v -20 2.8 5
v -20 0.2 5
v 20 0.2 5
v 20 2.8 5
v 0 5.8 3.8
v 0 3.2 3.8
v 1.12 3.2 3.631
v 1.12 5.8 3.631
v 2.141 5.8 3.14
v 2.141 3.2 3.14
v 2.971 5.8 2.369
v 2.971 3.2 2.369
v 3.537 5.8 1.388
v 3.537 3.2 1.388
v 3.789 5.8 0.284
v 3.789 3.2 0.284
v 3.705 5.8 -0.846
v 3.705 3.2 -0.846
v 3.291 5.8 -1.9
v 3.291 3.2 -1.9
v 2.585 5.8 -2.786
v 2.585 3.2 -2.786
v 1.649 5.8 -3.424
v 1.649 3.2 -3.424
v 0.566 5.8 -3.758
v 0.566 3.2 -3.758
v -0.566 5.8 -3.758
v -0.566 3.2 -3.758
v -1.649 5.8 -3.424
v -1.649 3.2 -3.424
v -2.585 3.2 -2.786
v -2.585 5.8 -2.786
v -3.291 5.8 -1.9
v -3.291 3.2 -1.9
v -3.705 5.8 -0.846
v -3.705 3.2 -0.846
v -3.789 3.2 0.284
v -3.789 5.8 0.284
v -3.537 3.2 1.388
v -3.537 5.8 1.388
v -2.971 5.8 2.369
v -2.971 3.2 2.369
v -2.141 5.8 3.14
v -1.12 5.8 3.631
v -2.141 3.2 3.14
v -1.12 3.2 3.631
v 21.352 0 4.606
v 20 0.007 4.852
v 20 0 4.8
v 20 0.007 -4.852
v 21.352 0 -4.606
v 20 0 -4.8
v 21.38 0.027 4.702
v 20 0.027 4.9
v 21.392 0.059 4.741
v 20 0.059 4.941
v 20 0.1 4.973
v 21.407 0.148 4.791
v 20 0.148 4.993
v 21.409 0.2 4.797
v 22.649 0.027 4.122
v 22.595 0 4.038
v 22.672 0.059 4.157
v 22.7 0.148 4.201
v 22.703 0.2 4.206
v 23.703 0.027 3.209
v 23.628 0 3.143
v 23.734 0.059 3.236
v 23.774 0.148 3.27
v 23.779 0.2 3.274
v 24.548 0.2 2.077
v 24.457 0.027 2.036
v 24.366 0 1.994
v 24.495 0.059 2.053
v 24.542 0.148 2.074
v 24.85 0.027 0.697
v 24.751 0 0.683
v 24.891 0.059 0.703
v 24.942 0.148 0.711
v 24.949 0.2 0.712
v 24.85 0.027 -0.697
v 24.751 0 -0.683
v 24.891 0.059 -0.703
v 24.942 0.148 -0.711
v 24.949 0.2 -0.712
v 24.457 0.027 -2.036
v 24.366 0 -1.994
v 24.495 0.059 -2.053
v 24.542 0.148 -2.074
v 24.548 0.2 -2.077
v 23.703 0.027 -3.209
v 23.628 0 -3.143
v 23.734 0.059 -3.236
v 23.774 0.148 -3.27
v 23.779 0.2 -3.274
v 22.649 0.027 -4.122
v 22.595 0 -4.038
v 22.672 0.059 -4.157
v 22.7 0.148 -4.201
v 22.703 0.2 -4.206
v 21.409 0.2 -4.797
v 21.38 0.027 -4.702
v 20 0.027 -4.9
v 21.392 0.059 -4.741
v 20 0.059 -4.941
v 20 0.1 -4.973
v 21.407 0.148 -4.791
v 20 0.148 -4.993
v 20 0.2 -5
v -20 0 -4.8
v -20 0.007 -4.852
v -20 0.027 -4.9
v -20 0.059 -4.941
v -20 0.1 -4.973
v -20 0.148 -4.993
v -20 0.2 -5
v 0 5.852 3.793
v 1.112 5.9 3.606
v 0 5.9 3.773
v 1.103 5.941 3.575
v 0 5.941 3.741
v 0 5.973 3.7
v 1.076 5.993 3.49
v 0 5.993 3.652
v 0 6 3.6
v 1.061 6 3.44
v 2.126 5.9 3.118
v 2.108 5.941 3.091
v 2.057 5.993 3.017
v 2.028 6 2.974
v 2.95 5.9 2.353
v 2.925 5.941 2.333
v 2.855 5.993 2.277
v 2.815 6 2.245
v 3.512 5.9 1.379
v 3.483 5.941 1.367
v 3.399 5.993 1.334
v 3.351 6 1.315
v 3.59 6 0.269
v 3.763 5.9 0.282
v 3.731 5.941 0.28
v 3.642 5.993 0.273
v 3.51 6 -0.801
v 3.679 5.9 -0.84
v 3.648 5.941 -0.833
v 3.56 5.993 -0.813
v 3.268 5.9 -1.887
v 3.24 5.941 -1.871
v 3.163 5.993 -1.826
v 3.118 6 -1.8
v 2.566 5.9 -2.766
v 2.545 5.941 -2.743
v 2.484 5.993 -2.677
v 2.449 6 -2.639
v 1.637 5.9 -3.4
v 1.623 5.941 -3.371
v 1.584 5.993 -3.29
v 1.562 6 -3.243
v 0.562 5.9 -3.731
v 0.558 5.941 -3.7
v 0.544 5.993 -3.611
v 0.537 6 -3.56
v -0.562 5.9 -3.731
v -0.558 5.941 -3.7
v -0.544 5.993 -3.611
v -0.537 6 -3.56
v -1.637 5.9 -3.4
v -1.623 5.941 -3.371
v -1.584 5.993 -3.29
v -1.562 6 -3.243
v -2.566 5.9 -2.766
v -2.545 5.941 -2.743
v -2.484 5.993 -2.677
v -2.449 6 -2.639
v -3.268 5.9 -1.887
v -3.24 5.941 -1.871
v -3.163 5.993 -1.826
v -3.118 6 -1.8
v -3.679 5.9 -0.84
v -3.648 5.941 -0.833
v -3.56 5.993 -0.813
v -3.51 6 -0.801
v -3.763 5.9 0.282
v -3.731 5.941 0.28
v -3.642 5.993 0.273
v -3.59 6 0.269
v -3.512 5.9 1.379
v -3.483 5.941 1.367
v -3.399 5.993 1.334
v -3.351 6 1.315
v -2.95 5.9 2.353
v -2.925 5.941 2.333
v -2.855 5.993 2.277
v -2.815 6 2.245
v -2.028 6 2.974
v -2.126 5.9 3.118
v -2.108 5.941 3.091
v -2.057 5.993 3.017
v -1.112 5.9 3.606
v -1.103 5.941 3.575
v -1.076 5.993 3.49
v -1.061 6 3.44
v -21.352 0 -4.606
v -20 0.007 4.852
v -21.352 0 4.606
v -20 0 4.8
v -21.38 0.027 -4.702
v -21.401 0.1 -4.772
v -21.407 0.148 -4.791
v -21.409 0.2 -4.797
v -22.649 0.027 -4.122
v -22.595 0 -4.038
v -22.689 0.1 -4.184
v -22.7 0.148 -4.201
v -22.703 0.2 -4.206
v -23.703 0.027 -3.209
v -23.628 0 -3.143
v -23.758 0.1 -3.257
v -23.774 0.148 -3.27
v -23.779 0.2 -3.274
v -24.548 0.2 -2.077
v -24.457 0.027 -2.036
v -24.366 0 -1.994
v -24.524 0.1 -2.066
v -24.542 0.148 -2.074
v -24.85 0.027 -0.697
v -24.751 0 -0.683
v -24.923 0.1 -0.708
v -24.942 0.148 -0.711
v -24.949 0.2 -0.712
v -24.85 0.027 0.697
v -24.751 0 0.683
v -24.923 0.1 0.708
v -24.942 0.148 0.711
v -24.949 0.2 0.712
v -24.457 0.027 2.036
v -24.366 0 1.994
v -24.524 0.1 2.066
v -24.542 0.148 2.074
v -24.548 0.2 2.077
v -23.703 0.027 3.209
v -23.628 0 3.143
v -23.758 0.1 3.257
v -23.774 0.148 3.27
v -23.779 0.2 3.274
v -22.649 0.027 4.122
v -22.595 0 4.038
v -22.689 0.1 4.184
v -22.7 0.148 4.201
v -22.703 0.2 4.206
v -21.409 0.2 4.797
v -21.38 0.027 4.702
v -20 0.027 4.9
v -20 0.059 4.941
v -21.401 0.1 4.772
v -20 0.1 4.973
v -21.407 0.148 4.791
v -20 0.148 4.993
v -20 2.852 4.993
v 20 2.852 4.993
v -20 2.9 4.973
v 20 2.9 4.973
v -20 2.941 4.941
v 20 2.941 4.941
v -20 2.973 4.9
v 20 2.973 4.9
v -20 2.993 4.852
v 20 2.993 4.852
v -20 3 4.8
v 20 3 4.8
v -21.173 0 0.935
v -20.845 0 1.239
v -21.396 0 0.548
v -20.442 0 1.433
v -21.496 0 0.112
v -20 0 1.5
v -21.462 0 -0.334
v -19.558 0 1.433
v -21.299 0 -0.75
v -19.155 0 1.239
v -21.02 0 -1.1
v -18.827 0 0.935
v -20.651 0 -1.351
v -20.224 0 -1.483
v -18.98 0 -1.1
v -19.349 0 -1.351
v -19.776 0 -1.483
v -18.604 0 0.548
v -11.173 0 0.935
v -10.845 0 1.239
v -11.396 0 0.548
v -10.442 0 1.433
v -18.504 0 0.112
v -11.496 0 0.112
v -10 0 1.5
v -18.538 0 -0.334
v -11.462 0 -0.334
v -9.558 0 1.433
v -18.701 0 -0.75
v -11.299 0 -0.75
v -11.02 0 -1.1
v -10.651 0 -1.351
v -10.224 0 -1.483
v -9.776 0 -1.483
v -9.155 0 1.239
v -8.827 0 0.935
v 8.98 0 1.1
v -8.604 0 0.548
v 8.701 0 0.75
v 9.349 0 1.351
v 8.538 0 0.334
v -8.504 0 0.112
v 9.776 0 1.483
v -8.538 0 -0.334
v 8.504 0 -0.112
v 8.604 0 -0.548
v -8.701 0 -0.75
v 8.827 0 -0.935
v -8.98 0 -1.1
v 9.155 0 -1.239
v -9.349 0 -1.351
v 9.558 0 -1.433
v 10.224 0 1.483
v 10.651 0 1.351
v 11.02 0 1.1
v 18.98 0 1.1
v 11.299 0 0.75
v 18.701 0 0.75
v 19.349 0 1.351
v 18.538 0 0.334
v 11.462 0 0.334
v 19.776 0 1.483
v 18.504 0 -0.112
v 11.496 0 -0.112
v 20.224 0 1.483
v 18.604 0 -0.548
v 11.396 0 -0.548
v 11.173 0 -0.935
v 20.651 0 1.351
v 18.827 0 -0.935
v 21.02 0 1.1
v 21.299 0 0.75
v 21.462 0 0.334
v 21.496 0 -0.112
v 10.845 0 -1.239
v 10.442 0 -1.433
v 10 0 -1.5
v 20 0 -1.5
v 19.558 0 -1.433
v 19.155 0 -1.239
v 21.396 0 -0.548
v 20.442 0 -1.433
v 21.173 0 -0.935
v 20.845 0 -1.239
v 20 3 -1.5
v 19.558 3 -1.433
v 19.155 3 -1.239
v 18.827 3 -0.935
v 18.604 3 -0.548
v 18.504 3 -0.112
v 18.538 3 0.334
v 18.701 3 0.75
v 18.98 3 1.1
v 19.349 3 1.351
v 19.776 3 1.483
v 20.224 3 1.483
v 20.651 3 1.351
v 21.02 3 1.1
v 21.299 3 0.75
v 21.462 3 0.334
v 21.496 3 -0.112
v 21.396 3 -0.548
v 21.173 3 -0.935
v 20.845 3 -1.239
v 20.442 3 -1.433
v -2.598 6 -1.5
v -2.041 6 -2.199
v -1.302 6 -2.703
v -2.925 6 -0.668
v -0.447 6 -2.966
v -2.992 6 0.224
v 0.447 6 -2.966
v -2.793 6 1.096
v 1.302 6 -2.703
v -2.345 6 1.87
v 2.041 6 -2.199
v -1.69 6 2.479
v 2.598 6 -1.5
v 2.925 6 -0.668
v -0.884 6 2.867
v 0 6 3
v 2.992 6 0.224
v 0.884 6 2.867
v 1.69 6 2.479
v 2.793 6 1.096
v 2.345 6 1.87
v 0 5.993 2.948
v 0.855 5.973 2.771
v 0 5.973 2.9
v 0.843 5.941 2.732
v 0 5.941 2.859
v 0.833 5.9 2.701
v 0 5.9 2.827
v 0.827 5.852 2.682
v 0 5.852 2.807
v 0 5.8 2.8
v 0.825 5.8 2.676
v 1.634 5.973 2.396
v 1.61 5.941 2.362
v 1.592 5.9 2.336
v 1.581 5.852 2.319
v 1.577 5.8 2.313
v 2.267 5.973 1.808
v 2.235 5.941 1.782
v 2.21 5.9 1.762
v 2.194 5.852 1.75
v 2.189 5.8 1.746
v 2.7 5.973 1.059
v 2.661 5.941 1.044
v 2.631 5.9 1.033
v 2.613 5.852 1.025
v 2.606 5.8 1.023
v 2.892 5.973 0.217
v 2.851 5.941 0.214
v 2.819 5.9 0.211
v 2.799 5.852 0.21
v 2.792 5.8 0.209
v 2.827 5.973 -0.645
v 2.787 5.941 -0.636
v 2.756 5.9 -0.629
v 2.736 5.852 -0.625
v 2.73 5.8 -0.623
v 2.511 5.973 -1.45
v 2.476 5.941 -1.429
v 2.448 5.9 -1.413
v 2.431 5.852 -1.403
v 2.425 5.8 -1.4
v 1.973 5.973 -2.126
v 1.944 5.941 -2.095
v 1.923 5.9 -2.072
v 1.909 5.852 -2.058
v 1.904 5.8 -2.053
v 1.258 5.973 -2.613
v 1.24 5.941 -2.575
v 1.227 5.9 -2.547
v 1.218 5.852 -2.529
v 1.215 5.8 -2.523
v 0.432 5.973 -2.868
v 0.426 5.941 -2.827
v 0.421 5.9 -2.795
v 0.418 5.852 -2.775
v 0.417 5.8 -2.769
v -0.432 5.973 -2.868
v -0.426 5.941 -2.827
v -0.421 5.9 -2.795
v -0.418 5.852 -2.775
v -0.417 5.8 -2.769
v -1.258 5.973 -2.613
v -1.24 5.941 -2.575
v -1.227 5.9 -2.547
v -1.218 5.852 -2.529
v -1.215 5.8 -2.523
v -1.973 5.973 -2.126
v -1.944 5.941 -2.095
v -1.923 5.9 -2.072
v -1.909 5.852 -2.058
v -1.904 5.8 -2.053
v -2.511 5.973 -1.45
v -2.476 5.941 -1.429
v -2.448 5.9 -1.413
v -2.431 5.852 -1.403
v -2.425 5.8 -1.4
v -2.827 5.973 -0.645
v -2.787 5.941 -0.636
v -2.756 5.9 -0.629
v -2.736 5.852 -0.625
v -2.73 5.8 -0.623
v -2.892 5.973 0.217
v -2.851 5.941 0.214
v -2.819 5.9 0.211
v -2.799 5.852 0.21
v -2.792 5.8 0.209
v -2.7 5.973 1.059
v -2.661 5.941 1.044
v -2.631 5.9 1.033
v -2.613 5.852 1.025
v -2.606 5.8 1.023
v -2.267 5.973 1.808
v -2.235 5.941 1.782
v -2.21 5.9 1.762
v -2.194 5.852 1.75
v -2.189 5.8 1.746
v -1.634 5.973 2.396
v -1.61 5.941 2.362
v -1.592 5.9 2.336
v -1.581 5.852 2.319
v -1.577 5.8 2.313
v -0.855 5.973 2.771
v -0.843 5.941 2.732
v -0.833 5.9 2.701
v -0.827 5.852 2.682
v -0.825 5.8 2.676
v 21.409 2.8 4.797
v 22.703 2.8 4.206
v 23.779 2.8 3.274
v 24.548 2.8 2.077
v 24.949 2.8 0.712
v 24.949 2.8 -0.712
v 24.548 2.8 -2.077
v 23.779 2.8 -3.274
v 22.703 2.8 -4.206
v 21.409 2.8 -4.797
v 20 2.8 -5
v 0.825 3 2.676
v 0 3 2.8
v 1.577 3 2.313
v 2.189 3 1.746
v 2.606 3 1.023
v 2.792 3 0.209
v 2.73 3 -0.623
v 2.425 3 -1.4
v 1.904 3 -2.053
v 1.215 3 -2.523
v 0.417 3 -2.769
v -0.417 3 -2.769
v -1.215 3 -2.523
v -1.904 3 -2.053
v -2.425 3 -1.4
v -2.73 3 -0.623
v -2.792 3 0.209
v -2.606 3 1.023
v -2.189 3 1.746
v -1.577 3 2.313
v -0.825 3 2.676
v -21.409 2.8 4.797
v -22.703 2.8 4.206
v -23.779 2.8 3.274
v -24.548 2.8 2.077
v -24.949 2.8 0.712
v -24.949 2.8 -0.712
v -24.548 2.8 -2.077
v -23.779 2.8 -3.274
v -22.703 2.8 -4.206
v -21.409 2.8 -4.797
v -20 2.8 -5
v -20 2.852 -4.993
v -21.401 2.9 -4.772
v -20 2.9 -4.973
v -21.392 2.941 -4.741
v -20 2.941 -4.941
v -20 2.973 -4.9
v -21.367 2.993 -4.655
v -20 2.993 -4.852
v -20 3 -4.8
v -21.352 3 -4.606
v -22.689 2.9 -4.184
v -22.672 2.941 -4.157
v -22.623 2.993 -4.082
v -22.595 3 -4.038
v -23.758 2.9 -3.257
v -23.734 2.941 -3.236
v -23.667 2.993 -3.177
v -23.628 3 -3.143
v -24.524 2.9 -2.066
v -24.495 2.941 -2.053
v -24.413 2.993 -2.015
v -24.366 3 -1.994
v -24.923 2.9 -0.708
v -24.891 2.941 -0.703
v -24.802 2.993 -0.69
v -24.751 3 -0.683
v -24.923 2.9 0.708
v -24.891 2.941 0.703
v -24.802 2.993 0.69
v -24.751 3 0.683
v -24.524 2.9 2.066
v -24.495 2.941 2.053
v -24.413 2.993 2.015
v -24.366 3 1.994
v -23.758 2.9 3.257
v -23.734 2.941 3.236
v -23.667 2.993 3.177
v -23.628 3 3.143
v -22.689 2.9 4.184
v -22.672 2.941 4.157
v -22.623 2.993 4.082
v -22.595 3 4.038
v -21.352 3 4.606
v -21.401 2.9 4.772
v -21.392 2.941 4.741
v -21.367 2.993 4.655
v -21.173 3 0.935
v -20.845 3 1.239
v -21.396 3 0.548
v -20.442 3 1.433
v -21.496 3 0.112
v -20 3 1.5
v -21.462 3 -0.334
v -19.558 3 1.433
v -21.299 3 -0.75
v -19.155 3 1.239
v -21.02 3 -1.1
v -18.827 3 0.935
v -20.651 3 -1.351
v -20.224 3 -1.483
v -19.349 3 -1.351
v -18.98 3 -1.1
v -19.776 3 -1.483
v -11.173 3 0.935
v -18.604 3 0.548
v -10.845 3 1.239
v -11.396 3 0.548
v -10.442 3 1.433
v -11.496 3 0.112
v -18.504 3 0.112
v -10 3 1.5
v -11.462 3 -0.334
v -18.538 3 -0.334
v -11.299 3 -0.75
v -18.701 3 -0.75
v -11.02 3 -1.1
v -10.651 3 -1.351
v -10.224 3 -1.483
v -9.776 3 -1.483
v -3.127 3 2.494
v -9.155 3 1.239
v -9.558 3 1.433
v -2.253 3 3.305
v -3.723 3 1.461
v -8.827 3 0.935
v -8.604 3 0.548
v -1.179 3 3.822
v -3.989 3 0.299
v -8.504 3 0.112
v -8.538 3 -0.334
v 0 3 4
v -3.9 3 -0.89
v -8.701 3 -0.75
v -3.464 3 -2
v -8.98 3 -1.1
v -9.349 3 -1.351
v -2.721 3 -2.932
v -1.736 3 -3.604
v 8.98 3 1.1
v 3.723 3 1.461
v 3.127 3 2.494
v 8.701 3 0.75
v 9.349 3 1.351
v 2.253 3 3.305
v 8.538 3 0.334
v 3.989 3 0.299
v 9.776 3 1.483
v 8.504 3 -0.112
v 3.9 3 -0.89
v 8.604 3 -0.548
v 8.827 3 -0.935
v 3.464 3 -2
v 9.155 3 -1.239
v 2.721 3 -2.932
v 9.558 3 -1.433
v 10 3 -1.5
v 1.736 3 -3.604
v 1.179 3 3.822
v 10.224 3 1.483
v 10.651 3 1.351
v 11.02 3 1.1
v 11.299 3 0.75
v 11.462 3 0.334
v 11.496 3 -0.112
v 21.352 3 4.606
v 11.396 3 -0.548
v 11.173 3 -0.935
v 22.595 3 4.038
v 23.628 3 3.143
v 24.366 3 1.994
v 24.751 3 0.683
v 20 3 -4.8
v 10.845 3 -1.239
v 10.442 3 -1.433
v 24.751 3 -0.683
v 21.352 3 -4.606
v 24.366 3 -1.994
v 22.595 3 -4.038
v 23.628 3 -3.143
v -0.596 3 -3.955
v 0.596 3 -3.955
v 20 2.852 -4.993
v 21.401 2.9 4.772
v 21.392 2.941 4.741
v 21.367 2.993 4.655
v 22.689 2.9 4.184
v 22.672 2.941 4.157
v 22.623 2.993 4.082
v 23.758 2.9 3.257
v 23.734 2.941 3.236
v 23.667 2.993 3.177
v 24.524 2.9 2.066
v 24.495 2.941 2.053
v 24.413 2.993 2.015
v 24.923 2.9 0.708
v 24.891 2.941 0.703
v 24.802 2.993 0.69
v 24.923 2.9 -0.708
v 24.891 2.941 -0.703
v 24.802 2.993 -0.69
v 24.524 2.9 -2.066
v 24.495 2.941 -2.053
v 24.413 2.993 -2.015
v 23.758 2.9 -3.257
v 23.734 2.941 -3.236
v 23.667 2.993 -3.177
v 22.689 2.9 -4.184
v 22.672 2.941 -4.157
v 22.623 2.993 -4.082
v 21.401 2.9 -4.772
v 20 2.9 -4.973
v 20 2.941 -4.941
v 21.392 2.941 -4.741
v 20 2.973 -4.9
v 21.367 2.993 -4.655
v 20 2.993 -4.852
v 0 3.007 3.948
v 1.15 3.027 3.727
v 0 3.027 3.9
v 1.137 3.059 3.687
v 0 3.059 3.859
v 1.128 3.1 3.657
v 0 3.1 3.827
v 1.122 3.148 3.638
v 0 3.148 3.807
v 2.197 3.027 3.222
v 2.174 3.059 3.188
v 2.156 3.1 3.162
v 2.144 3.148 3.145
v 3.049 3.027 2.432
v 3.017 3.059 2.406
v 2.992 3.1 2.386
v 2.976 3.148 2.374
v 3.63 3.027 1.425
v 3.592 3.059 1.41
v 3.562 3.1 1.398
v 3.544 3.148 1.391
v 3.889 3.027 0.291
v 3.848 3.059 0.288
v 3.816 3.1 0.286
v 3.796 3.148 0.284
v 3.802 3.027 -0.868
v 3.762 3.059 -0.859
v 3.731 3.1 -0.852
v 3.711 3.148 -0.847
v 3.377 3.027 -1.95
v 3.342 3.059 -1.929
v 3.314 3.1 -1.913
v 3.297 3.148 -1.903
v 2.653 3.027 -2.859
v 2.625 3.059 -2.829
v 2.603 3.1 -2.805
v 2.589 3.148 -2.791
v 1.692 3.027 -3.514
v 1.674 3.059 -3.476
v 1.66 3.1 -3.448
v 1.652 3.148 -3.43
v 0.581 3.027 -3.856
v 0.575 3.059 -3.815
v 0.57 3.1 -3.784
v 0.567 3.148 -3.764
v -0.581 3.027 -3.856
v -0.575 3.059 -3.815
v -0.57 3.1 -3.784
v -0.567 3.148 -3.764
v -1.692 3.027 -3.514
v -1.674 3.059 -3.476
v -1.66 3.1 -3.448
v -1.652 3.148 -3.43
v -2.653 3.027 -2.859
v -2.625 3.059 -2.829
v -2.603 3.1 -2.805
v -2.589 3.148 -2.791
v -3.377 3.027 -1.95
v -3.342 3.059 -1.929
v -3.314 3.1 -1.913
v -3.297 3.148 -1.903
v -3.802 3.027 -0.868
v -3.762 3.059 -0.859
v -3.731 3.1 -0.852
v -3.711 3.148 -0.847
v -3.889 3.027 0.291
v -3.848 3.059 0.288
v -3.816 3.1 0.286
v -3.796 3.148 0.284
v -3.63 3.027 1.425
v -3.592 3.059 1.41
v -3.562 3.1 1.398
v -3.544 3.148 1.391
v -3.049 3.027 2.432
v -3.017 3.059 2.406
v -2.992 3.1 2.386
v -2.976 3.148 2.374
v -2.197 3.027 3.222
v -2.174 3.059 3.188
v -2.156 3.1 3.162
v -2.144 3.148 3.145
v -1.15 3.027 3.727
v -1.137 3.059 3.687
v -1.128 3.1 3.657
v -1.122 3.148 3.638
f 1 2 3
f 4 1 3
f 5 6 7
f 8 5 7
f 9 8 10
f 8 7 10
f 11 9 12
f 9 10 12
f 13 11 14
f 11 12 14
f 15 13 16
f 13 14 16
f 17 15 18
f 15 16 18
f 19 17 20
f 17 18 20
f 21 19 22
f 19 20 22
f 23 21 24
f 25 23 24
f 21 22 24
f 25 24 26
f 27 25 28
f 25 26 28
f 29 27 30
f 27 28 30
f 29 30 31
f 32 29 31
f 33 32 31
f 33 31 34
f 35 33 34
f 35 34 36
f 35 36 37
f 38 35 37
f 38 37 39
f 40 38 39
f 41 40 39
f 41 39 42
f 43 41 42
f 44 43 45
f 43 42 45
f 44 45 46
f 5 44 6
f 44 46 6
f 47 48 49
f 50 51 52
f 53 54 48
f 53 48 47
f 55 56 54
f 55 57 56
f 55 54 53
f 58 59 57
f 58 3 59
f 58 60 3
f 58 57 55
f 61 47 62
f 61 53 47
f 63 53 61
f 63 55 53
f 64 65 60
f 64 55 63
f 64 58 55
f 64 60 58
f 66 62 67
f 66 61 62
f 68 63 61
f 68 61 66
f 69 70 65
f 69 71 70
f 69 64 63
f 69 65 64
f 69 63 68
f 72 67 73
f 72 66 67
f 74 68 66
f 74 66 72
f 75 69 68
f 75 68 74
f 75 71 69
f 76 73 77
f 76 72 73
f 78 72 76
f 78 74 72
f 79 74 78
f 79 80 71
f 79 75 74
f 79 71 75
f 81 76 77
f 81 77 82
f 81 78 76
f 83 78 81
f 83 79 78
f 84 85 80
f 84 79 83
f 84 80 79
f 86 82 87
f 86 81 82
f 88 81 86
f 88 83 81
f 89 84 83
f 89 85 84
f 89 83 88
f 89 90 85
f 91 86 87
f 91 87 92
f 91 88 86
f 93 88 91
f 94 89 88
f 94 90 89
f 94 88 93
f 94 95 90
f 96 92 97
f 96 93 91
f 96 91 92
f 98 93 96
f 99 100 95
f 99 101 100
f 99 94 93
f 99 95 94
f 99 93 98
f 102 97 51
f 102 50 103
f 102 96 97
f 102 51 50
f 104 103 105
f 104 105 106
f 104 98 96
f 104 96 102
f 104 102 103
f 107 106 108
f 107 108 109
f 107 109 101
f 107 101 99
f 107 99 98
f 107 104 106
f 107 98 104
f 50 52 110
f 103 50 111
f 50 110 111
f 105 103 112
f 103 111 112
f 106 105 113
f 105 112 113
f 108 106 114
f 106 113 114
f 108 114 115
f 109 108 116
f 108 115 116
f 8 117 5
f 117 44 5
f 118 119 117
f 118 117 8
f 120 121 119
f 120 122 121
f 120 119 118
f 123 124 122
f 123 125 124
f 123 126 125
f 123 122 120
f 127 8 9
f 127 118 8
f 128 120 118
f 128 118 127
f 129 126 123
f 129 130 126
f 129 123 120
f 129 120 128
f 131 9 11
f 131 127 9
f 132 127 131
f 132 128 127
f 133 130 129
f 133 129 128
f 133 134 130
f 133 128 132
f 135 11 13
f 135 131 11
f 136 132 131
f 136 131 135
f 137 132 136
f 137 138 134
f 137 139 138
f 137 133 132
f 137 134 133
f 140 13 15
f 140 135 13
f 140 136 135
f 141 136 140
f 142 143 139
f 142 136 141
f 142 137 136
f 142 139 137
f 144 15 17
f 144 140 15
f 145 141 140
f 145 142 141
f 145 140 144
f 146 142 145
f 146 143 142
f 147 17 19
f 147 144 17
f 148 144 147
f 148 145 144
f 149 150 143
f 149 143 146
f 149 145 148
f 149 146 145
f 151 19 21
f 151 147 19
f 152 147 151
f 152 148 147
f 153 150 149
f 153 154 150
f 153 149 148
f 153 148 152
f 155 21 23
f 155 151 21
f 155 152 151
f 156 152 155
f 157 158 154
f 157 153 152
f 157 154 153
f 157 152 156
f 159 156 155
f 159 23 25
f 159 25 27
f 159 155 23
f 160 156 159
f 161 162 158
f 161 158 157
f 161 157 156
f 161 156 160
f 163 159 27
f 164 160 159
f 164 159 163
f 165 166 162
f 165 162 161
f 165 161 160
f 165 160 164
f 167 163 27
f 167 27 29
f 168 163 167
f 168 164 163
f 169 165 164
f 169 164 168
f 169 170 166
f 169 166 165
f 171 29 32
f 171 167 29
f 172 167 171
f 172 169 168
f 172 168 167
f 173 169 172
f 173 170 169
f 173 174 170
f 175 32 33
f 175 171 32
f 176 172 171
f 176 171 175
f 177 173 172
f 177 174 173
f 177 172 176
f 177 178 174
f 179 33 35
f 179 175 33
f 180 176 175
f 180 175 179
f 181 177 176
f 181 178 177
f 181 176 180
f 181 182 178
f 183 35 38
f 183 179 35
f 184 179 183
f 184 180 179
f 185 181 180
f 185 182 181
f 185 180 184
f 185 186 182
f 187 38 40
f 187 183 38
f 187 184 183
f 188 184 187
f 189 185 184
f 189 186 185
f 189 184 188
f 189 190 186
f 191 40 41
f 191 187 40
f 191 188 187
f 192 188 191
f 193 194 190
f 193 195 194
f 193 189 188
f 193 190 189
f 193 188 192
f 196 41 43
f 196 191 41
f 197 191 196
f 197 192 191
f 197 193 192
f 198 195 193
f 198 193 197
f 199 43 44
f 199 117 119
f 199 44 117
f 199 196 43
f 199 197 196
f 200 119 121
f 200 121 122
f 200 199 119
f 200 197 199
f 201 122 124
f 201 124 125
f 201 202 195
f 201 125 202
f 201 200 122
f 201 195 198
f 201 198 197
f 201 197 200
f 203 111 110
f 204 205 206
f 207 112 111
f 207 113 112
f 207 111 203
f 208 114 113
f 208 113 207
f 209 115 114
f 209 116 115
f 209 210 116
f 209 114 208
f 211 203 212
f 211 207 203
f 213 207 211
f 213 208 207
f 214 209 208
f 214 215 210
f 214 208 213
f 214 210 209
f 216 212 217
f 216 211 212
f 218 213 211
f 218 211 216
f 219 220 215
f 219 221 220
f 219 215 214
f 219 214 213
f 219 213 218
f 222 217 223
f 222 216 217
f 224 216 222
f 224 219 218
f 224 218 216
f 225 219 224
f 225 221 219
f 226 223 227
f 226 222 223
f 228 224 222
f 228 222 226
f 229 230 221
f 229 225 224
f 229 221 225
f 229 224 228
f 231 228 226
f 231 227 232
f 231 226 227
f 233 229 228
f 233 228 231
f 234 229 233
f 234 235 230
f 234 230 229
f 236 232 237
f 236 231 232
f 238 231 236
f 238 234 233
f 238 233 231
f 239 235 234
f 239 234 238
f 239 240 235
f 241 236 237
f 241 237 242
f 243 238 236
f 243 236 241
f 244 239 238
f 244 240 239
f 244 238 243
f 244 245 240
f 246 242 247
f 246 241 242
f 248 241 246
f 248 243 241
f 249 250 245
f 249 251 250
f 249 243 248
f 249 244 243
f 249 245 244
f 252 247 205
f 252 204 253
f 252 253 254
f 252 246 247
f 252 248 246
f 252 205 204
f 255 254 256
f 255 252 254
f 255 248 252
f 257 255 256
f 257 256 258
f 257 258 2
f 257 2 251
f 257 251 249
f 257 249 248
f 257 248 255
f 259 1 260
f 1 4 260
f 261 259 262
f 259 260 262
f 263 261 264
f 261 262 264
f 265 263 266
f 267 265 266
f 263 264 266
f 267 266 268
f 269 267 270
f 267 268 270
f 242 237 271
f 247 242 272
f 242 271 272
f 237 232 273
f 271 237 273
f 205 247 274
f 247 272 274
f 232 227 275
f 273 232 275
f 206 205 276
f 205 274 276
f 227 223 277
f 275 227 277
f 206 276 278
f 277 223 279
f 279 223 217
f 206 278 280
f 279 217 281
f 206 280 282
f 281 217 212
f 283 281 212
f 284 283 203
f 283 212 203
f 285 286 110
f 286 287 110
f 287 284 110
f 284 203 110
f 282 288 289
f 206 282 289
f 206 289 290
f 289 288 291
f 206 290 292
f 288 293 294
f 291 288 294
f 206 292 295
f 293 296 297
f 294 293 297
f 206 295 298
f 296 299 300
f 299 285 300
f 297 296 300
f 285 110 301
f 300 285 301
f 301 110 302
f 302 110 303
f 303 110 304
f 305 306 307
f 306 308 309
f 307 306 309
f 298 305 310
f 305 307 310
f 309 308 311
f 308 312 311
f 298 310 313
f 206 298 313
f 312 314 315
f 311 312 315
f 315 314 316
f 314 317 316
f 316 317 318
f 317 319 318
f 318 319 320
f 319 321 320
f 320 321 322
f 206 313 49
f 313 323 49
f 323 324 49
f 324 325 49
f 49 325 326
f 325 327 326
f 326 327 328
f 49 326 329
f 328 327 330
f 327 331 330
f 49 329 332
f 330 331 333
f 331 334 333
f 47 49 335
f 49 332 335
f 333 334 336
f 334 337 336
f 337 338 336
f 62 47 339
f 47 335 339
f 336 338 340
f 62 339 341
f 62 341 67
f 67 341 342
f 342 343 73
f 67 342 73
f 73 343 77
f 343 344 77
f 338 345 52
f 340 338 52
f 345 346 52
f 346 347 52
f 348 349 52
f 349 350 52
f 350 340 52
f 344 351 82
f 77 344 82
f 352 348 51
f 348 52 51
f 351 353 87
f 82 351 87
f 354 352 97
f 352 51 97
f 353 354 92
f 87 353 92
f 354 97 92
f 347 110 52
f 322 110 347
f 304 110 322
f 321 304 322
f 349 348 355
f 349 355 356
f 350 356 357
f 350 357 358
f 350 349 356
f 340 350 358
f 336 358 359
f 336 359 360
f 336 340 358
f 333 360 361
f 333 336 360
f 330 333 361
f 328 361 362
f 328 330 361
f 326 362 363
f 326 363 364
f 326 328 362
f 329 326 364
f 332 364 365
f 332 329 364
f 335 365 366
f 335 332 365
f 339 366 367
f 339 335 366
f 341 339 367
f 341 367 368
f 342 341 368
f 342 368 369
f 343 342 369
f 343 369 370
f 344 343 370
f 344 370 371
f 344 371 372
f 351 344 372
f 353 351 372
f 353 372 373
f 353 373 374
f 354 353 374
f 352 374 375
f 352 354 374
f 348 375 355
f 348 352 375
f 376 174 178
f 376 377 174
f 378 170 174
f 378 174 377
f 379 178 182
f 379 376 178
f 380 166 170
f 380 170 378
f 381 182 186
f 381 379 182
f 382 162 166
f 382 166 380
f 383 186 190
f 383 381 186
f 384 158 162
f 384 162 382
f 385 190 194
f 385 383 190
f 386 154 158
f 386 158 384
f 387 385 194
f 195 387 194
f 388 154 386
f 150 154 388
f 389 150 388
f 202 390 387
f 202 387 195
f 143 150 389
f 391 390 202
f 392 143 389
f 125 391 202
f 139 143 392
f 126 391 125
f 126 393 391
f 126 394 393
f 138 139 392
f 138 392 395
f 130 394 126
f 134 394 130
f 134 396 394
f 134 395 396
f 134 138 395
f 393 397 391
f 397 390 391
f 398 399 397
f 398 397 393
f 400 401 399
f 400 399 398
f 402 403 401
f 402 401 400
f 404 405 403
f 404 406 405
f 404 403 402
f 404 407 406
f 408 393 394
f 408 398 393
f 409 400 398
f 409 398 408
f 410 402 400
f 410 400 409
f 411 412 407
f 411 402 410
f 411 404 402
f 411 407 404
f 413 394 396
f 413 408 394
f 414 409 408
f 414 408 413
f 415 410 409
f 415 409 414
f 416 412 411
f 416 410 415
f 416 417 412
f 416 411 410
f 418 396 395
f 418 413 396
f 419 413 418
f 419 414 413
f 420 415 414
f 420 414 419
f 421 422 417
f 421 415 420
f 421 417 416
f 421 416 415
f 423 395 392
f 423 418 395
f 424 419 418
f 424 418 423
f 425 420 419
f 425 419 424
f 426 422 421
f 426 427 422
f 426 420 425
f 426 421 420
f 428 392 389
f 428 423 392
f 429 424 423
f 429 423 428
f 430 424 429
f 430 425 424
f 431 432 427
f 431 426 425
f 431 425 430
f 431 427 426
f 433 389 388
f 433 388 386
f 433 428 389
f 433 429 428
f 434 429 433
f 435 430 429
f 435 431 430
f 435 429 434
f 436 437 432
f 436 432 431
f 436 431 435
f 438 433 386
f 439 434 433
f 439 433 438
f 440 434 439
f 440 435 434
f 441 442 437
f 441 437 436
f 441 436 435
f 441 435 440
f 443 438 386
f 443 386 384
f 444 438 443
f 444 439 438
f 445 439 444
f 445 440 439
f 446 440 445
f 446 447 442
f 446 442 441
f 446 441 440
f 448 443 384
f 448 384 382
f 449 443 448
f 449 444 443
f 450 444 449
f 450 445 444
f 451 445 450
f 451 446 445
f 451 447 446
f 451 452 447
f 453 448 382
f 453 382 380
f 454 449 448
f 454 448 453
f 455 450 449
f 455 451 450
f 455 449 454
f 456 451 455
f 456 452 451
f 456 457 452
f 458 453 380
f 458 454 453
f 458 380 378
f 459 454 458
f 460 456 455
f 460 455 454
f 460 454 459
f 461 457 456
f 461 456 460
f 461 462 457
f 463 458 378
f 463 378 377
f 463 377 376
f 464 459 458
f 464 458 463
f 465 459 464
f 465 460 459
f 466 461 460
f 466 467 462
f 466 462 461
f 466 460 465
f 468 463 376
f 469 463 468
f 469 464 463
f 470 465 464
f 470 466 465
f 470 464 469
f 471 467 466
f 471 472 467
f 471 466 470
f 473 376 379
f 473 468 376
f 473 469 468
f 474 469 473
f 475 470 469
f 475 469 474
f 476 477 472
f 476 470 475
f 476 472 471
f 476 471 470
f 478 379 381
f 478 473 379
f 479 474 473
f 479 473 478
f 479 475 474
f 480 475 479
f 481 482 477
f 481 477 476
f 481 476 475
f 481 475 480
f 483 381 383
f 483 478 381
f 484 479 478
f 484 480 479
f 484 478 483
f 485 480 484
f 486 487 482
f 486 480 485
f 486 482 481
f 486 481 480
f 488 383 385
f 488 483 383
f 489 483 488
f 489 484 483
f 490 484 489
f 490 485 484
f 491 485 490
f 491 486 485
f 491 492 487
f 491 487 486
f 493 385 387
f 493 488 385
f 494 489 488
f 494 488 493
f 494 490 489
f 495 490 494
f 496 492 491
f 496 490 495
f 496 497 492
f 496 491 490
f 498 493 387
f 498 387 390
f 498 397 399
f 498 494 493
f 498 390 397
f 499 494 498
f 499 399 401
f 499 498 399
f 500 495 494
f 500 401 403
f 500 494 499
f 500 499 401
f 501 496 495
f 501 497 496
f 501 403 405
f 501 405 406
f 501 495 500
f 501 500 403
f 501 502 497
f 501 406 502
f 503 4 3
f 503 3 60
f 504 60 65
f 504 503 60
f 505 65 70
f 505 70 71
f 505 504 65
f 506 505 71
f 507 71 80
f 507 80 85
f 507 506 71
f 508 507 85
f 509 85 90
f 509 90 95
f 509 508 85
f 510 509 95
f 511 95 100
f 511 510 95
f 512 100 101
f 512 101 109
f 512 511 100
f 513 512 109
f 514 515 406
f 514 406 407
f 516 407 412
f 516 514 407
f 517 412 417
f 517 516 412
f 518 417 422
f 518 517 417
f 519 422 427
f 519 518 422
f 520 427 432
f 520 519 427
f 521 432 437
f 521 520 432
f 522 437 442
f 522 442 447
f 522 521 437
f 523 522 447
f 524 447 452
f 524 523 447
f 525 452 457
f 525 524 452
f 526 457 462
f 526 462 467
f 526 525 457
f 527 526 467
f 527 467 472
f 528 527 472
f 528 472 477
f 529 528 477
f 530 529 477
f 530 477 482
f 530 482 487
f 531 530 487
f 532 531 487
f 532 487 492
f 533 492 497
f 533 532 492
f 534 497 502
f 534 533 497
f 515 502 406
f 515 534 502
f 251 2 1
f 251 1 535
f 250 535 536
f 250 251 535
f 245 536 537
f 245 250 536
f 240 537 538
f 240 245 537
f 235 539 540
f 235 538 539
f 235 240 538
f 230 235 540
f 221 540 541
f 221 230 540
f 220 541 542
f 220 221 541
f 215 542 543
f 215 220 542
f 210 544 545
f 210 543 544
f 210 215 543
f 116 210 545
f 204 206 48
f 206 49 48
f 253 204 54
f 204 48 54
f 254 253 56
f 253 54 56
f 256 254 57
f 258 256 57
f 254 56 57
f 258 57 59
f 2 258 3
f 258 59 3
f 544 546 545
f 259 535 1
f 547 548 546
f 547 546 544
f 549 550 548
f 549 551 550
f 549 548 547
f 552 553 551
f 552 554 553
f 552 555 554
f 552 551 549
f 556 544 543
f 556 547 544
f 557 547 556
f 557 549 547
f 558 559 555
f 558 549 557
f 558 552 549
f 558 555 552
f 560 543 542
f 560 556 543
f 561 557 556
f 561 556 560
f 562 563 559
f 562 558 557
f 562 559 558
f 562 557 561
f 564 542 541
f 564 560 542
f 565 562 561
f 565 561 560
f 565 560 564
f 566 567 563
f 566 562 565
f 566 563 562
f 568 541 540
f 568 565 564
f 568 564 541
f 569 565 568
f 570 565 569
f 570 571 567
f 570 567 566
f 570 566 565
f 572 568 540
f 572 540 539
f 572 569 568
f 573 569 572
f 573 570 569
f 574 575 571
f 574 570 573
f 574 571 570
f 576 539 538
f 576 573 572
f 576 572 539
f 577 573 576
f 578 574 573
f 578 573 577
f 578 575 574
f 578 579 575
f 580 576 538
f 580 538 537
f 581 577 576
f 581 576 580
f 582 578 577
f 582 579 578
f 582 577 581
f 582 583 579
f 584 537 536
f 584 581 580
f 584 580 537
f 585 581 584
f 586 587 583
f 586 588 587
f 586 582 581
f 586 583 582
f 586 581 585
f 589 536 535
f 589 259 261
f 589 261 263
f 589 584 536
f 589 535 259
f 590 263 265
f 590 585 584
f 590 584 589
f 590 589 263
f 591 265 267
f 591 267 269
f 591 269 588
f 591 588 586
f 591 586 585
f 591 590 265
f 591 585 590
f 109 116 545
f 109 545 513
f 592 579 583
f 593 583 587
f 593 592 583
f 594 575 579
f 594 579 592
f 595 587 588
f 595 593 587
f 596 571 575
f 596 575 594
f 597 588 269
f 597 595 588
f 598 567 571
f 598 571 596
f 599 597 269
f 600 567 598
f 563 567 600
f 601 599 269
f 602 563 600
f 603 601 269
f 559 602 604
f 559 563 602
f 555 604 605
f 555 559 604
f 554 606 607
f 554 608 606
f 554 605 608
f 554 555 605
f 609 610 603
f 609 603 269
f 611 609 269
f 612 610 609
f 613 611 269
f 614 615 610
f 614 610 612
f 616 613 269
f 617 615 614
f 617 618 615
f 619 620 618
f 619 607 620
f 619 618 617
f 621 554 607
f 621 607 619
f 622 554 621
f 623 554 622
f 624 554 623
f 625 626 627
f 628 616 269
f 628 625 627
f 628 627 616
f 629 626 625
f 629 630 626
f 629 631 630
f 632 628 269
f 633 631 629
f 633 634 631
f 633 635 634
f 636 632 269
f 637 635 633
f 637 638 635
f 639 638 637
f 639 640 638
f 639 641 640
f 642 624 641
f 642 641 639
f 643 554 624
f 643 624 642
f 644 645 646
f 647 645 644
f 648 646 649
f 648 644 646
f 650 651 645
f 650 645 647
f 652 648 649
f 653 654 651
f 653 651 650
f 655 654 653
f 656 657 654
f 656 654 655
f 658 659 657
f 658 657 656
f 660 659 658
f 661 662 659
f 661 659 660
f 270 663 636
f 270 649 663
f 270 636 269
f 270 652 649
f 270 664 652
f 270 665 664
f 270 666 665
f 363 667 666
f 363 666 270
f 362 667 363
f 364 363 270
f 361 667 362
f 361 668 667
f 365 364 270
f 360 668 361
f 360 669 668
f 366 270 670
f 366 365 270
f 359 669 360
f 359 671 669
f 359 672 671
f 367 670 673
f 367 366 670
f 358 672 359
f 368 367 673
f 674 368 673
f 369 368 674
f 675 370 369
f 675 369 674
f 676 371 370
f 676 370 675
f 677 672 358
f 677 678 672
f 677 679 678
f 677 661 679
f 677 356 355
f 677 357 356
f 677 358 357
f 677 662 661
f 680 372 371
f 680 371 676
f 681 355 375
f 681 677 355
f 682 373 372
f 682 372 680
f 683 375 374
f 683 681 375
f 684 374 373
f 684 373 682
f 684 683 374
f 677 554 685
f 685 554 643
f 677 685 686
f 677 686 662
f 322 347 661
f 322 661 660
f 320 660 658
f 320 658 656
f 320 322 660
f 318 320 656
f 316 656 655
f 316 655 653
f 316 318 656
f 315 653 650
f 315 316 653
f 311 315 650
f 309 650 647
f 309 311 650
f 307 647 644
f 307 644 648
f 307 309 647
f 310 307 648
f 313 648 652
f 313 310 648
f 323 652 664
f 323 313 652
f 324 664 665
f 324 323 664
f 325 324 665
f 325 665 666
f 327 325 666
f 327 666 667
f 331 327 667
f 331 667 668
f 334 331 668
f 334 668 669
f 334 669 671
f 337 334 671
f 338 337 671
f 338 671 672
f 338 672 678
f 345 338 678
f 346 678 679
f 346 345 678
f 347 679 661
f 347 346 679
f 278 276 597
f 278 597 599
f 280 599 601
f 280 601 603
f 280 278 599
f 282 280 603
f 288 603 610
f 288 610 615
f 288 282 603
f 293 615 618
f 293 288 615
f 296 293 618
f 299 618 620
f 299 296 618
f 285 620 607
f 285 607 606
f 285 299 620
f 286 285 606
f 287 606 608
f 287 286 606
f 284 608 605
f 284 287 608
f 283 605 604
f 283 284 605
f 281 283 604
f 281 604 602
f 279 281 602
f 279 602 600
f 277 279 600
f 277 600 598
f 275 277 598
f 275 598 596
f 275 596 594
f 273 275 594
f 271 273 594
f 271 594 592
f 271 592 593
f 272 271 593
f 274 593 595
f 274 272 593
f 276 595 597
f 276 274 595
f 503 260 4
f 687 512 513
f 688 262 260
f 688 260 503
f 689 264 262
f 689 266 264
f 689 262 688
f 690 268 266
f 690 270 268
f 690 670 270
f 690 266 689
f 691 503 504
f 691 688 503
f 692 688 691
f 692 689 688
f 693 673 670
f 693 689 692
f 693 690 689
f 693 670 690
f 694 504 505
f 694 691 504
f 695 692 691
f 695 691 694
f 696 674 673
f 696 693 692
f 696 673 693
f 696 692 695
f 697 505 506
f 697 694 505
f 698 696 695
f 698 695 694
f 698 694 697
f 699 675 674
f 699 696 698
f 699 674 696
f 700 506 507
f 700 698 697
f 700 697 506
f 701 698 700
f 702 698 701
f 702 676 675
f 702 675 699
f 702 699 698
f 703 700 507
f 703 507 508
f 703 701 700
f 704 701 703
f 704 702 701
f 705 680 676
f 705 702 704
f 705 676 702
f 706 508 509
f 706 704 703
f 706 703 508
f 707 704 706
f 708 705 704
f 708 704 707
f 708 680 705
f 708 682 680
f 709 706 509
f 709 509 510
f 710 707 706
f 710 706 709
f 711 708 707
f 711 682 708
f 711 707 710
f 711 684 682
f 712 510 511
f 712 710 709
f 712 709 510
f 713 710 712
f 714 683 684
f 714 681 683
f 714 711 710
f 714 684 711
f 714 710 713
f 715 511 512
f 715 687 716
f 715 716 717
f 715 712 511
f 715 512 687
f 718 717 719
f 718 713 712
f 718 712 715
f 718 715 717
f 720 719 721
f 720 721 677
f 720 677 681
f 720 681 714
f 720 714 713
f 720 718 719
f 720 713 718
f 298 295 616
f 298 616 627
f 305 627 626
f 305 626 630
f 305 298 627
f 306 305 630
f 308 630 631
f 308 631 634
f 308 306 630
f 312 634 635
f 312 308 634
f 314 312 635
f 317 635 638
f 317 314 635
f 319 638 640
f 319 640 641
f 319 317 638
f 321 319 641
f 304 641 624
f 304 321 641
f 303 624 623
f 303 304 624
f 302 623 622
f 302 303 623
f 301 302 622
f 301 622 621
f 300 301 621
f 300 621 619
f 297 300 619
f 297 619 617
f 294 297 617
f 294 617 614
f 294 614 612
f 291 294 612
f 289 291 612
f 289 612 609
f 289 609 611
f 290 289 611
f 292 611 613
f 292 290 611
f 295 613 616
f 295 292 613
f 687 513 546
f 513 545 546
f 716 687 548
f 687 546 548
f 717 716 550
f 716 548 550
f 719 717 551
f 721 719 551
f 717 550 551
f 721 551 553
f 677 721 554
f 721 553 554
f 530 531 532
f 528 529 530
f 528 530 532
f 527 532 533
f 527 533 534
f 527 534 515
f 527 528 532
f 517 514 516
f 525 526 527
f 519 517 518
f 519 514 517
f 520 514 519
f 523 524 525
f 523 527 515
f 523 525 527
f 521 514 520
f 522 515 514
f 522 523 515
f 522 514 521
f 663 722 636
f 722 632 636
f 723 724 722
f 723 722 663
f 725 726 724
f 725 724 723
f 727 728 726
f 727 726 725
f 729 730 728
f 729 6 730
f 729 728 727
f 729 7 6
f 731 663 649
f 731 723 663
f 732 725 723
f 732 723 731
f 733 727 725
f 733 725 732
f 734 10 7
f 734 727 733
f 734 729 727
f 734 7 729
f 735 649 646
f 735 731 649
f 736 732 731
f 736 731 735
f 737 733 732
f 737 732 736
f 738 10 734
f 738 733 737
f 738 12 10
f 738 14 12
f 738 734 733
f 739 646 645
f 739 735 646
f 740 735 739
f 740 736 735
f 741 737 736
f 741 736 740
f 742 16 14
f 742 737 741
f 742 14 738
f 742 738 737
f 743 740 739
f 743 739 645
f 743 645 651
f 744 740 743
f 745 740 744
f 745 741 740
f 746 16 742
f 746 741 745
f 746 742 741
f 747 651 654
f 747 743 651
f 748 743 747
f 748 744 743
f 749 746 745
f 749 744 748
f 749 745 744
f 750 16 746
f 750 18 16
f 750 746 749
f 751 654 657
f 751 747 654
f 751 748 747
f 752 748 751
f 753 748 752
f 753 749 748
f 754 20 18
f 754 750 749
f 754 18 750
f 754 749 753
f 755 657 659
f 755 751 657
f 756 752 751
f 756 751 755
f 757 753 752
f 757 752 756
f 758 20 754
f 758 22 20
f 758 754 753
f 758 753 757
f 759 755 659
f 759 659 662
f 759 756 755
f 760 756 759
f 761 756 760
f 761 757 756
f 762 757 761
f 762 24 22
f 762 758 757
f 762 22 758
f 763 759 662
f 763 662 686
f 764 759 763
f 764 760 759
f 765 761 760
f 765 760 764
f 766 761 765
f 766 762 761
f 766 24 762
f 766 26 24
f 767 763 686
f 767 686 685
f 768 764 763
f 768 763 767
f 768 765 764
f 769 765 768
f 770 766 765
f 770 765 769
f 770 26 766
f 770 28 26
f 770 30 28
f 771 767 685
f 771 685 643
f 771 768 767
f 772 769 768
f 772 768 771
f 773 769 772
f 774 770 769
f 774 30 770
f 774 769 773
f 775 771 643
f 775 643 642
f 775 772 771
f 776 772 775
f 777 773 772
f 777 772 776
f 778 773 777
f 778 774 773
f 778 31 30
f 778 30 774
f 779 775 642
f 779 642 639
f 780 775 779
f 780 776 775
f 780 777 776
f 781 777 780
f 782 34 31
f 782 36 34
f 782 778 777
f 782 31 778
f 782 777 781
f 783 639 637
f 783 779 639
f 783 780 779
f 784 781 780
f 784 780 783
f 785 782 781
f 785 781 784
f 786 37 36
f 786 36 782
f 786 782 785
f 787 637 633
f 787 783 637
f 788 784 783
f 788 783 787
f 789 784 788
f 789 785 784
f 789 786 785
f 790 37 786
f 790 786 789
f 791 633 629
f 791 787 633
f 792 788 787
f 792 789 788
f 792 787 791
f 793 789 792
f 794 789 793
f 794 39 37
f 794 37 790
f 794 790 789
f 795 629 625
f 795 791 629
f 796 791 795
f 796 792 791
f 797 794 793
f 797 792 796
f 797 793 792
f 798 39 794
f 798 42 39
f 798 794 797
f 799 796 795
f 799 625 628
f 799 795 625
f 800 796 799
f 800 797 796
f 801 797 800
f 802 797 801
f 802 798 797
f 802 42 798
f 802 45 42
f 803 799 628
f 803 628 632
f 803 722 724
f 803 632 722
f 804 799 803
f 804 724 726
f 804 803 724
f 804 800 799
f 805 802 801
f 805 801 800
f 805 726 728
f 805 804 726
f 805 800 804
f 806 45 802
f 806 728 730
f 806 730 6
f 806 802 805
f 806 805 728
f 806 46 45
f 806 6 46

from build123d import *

# Parameters (mm, degrees)
SKETCH1_W           = 50
SKETCH1_H           = 10
SKETCH1_R           = 1.5
BOSS_EXTRUDE1_DEPTH = 3
FILLET2_RADIUS      = 5
FILLET2_LENGTH      = 3
FILLET3_RADIUS      = 5
FILLET3_LENGTH      = 3
SKETCH2_R           = 3.8
SKETCH2_R_2         = 2.8
BOSS_EXTRUDE2_DEPTH = 3
FILLET4_R           = 0.2


with BuildPart() as part:
    # Sketch1 → Boss-Extrude1 (new body)
    with BuildSketch(Plane(origin=(0, 0, 0), x_dir=(1, 0, 0), z_dir=(0, 1, 0))):
        Rectangle(SKETCH1_W, SKETCH1_H)
        with Locations(Location((-20, 0, 0), (0, 0, 270))):
            Circle(SKETCH1_R, mode=Mode.SUBTRACT)
        with Locations(Location((-10, 0, 0), (0, 0, 270))):
            Circle(SKETCH1_R, mode=Mode.SUBTRACT)
        with Locations(Location((10, 0, 0), (0, 0, 90))):
            Circle(SKETCH1_R, mode=Mode.SUBTRACT)
        with Locations(Location((20, 0, 0), (0, 0, 90))):
            Circle(SKETCH1_R, mode=Mode.SUBTRACT)
    extrude(amount=BOSS_EXTRUDE1_DEPTH)

    # Fillet2: full round fillet: the end face becomes a half cylinder, R = half its width
    fillet2_face = Plane((-25, 1.5, 0), x_dir=(0, -1, 0), z_dir=(-1, 0, 0))  # on the end face: x along it, z out of the body
    fillet2_slab = fillet2_face.offset(-FILLET2_RADIUS / 2) * Box(FILLET2_LENGTH, 2 * FILLET2_RADIUS, FILLET2_RADIUS, mode=Mode.PRIVATE)  # the body's end, R deep
    fillet2_round = Plane((-20, 1.5, 0), x_dir=(-1, 0, 0), z_dir=(0, -1, 0)) * Cylinder(FILLET2_RADIUS, FILLET2_LENGTH, mode=Mode.PRIVATE)  # its axis R under the face
    add(fillet2_slab - fillet2_round, mode=Mode.SUBTRACT)

    # Fillet3: full round fillet: the end face becomes a half cylinder, R = half its width
    fillet3_face = Plane((25, 1.5, 0), x_dir=(0, 1, 0), z_dir=(1, 0, 0))  # on the end face: x along it, z out of the body
    fillet3_slab = fillet3_face.offset(-FILLET3_RADIUS / 2) * Box(FILLET3_LENGTH, 2 * FILLET3_RADIUS, FILLET3_RADIUS, mode=Mode.PRIVATE)  # the body's end, R deep
    fillet3_round = Plane((20, 1.5, 0), x_dir=(1, 0, 0), z_dir=(0, 1, 0)) * Cylinder(FILLET3_RADIUS, FILLET3_LENGTH, mode=Mode.PRIVATE)  # its axis R under the face
    add(fillet3_slab - fillet3_round, mode=Mode.SUBTRACT)

    # Sketch2 → Boss-Extrude2 (add)
    with BuildSketch(Plane(origin=(0, 3, 0), x_dir=(1, 0, 0), z_dir=(0, 1, 0))):
        with Locations(Location((0, 0, 0), (0, 0, 270))):
            Circle(SKETCH2_R)
        with Locations(Location((0, 0, 0), (0, 0, 270))):
            Circle(SKETCH2_R_2, mode=Mode.SUBTRACT)
    extrude(amount=BOSS_EXTRUDE2_DEPTH)

    # Fillet4
    fillet4_edges = [part.edges().sort_by_distance(p)[0] for p in [
        (0, 0, 5),
        (0, 3, 5),
        (-25, 0, 0),
        (-25, 3, 0),
        (0, 0, -5),
        (0, 3, -5),
        (25, 0, 0),
        (25, 3, 0),
        (0, 6, -3.8),
        (0, 3, -3.8),
        (0, 6, -2.8),
    ]]
    fillet(fillet4_edges, radius=FILLET4_R)


solid = part.part
